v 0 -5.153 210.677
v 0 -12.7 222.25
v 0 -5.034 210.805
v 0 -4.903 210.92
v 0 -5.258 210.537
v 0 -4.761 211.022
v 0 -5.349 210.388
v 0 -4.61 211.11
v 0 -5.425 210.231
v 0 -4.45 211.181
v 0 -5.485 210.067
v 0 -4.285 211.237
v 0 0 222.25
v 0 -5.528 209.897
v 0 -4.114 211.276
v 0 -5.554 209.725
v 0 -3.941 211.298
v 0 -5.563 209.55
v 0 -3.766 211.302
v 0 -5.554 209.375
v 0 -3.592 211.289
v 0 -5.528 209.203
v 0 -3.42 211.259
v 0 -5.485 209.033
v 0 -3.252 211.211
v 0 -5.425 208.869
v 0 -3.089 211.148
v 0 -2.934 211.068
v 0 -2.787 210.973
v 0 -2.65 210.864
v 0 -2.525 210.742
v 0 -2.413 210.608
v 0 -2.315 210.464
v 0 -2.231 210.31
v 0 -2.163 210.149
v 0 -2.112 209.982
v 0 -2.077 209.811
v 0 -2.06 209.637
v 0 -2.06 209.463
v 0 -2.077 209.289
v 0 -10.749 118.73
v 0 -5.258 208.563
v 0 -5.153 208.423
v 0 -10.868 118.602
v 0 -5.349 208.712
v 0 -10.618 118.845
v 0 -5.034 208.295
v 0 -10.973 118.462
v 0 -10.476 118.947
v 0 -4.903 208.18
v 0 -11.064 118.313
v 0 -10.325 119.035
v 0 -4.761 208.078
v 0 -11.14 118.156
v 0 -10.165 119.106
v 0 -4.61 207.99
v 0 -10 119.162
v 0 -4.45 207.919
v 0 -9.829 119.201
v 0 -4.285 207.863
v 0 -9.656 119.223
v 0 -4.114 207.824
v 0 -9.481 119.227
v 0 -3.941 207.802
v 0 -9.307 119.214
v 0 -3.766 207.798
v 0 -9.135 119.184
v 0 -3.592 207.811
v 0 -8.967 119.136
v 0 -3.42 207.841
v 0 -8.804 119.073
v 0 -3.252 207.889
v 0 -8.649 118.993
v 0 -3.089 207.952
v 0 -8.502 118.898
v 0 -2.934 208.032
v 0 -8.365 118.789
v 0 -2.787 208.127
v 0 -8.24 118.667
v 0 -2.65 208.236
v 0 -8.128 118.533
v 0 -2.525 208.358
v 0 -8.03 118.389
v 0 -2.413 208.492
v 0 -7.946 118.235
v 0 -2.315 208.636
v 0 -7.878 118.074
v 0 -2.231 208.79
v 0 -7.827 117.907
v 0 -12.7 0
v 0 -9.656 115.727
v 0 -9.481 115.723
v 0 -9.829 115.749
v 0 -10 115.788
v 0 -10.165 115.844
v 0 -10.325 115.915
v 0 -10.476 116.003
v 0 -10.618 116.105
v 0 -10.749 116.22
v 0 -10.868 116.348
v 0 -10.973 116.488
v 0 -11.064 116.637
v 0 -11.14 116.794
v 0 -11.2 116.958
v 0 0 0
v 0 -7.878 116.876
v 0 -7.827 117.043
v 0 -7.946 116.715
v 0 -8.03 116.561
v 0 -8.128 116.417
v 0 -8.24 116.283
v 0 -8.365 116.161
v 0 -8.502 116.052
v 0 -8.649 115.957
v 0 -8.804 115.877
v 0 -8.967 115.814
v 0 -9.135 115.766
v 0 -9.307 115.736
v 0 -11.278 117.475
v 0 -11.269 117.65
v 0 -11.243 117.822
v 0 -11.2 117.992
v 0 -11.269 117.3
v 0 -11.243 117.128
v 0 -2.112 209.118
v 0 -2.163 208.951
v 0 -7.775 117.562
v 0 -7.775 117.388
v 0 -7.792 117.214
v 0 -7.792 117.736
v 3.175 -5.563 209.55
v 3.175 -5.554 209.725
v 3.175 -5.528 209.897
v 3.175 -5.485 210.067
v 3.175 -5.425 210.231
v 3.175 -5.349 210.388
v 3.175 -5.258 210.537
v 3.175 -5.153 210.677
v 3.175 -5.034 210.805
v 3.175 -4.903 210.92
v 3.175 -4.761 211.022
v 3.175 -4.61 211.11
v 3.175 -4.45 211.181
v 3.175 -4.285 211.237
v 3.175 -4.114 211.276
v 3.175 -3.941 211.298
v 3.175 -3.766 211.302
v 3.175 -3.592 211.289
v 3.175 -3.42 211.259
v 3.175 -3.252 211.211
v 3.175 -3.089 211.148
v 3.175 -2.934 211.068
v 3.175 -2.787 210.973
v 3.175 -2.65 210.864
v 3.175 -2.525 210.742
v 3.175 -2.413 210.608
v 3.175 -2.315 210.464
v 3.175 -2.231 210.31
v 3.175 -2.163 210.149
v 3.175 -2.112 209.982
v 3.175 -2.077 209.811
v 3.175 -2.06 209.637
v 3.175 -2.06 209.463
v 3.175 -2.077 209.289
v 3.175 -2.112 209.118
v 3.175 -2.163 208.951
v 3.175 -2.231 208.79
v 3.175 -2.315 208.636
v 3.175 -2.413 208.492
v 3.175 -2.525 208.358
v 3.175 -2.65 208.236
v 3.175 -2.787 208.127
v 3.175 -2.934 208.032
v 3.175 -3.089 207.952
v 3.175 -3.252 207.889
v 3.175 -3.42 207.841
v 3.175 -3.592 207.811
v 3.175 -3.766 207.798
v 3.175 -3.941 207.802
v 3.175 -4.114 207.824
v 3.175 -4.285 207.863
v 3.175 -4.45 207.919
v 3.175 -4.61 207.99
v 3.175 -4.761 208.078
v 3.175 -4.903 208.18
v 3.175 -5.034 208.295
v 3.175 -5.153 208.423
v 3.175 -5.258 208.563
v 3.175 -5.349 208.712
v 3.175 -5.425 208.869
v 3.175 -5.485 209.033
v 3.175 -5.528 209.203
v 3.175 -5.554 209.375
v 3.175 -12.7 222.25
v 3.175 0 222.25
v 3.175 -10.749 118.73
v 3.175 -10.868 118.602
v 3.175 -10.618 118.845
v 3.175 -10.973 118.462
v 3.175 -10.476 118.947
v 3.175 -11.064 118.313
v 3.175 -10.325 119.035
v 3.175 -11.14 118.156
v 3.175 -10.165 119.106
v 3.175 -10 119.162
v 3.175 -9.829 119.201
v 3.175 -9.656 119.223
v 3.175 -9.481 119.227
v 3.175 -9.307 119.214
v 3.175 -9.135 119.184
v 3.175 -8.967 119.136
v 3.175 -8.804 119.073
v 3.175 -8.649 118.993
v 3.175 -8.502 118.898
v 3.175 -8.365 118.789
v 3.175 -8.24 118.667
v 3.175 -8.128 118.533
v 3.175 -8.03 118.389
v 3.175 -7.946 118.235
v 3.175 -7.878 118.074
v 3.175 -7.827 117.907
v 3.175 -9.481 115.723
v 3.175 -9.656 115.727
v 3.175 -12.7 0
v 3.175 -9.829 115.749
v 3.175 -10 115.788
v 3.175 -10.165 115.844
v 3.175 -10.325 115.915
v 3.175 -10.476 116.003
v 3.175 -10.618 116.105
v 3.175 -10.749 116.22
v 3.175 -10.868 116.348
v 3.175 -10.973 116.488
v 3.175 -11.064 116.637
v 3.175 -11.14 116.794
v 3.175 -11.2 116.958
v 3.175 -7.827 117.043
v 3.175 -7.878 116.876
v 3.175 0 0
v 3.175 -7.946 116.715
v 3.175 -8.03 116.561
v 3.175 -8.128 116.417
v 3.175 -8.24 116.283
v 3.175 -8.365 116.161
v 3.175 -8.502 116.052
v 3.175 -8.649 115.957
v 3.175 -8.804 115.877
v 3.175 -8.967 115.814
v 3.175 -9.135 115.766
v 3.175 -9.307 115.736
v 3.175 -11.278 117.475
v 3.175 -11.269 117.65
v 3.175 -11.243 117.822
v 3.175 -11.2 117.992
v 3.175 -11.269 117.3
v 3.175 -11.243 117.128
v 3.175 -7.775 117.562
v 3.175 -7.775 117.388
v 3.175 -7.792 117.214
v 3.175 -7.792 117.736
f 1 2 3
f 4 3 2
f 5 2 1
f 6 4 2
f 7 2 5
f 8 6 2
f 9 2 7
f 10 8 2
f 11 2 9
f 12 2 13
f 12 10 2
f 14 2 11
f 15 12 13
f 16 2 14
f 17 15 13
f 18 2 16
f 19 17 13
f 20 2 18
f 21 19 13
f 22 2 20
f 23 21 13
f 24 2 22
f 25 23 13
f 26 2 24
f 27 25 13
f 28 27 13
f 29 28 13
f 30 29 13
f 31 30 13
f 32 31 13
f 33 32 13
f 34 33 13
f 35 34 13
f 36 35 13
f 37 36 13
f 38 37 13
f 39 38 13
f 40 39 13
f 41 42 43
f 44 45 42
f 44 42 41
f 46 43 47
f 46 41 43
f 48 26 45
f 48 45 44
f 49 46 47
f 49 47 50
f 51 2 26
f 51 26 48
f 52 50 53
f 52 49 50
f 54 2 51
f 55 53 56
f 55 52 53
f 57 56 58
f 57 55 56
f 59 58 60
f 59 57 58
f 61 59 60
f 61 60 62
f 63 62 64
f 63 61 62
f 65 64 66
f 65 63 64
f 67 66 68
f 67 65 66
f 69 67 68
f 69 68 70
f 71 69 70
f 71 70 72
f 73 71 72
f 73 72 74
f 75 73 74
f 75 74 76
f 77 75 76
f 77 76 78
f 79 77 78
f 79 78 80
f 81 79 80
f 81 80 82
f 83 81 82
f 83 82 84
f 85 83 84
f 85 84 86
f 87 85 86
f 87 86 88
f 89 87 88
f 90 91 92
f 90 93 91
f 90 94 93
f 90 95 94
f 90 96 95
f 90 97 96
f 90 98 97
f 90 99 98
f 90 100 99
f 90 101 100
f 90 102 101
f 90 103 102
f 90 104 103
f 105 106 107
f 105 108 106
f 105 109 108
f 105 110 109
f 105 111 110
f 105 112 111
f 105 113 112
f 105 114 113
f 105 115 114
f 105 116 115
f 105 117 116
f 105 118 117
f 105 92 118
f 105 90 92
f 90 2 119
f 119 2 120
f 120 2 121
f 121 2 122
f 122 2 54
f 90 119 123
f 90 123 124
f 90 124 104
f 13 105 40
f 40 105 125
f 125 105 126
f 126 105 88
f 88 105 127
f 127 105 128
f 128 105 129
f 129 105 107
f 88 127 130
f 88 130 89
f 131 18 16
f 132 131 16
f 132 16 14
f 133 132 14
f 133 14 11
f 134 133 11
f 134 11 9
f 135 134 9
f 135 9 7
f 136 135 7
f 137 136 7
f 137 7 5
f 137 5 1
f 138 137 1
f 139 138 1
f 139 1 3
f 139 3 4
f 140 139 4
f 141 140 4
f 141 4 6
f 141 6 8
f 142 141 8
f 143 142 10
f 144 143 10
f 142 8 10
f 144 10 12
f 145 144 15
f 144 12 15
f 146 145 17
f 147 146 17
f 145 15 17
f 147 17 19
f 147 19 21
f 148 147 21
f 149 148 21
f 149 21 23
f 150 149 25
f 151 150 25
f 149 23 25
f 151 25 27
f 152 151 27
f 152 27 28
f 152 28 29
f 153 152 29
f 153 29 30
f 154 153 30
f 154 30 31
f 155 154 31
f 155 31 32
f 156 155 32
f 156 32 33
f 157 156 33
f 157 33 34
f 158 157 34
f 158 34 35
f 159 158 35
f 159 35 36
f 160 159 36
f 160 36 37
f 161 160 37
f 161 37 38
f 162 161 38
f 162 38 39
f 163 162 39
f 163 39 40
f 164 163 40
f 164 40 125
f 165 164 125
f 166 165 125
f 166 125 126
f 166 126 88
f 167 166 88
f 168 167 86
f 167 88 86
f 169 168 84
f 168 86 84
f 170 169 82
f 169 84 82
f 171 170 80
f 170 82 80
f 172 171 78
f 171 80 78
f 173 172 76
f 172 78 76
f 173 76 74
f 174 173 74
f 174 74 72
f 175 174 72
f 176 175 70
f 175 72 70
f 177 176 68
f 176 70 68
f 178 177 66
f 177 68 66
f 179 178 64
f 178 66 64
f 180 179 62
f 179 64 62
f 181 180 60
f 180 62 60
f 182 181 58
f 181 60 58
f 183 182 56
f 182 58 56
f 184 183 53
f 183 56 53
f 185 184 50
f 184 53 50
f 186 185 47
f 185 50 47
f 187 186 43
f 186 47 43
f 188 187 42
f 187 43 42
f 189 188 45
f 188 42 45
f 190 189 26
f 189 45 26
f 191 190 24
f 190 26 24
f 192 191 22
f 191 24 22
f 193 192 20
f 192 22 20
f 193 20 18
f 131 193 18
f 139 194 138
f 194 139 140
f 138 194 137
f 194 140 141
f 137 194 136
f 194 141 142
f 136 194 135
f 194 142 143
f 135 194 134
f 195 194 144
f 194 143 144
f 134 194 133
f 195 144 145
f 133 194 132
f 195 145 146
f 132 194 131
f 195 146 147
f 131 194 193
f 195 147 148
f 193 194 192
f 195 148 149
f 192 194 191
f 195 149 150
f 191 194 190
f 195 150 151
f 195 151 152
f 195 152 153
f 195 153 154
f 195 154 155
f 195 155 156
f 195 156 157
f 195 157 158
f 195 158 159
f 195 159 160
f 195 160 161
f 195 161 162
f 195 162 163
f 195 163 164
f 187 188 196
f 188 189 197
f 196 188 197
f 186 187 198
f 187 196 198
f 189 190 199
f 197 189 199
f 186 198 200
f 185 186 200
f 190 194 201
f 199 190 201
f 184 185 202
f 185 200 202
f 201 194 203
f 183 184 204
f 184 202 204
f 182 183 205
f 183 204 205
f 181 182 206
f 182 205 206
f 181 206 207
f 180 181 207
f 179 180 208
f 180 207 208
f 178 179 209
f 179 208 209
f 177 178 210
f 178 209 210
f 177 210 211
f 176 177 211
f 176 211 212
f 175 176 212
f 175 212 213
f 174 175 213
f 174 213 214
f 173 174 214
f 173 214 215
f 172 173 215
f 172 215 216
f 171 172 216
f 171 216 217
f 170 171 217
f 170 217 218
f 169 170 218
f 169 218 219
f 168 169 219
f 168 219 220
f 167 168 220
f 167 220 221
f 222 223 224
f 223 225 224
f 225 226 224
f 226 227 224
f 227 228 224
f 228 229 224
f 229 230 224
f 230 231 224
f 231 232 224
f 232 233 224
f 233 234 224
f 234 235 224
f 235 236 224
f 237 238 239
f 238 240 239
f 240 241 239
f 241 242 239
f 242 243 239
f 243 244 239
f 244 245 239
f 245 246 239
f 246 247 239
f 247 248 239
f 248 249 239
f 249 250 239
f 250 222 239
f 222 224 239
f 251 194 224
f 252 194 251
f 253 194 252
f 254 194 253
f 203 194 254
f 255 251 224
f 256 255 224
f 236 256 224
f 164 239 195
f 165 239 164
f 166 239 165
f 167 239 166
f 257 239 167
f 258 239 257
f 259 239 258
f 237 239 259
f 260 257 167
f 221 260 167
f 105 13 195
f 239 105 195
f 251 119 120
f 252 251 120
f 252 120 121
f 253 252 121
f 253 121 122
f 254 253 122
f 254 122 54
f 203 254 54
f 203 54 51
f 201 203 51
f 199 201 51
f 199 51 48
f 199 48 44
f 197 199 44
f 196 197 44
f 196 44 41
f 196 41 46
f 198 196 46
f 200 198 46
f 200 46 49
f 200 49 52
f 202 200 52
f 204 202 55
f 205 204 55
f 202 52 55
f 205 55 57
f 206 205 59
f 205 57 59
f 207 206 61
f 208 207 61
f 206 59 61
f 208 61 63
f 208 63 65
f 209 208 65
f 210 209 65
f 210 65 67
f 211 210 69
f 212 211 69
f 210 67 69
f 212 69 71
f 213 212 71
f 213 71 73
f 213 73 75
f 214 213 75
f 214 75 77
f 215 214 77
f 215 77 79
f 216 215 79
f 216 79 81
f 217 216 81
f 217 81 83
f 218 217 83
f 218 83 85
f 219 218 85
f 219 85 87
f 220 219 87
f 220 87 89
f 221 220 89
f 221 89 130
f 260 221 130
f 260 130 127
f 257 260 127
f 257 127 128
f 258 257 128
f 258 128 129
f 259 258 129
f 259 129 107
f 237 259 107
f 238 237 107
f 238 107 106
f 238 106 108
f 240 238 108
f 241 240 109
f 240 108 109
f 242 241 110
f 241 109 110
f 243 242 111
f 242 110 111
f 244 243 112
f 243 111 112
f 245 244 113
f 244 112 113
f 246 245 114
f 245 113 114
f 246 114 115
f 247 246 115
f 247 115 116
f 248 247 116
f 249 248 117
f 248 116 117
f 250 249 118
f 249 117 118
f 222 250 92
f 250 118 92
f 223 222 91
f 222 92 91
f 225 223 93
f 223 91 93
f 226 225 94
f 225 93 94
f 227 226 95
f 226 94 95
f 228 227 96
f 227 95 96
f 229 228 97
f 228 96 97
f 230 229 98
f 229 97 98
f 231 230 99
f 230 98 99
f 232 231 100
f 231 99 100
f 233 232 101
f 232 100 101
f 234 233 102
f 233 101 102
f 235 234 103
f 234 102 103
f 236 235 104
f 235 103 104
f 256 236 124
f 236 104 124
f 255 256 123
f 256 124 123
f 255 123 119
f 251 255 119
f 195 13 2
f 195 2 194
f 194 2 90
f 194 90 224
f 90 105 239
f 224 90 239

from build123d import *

# Parameters (mm, degrees)
SKETCH1_W                  = 3.175
SKETCH1_H                  = 12.7
BOSS_EXTRUDE1_DEPTH        = 222.25
F_6_0_138_DIAMETER_HOLE1_D = 3.5052
F_6_0_138_DIAMETER_HOLE3_D = 3.5052


with BuildPart() as part:
    # Sketch1 → Boss-Extrude1 (new body)
    with BuildSketch(Plane.XY):
        with Locations((1.5875, -6.35)):
            Rectangle(SKETCH1_W, SKETCH1_H)
    extrude(amount=BOSS_EXTRUDE1_DEPTH)

    # #6 (0.138) Diameter Hole1 (through all)
    with Locations(Plane(origin=(3.175, -3.81, 209.55), x_dir=(0, 1, 0), z_dir=(1, 0, 0))):
        with Locations((0, 0)):
            Hole(F_6_0_138_DIAMETER_HOLE1_D / 2)

    # #6 (0.138) Diameter Hole3 (through all)
    with Locations(Plane(origin=(3.175, -9.525, 117.475), x_dir=(0, 1, 0), z_dir=(1, 0, 0))):
        with Locations((0, 0)):
            Hole(F_6_0_138_DIAMETER_HOLE3_D / 2)


solid = part.part
